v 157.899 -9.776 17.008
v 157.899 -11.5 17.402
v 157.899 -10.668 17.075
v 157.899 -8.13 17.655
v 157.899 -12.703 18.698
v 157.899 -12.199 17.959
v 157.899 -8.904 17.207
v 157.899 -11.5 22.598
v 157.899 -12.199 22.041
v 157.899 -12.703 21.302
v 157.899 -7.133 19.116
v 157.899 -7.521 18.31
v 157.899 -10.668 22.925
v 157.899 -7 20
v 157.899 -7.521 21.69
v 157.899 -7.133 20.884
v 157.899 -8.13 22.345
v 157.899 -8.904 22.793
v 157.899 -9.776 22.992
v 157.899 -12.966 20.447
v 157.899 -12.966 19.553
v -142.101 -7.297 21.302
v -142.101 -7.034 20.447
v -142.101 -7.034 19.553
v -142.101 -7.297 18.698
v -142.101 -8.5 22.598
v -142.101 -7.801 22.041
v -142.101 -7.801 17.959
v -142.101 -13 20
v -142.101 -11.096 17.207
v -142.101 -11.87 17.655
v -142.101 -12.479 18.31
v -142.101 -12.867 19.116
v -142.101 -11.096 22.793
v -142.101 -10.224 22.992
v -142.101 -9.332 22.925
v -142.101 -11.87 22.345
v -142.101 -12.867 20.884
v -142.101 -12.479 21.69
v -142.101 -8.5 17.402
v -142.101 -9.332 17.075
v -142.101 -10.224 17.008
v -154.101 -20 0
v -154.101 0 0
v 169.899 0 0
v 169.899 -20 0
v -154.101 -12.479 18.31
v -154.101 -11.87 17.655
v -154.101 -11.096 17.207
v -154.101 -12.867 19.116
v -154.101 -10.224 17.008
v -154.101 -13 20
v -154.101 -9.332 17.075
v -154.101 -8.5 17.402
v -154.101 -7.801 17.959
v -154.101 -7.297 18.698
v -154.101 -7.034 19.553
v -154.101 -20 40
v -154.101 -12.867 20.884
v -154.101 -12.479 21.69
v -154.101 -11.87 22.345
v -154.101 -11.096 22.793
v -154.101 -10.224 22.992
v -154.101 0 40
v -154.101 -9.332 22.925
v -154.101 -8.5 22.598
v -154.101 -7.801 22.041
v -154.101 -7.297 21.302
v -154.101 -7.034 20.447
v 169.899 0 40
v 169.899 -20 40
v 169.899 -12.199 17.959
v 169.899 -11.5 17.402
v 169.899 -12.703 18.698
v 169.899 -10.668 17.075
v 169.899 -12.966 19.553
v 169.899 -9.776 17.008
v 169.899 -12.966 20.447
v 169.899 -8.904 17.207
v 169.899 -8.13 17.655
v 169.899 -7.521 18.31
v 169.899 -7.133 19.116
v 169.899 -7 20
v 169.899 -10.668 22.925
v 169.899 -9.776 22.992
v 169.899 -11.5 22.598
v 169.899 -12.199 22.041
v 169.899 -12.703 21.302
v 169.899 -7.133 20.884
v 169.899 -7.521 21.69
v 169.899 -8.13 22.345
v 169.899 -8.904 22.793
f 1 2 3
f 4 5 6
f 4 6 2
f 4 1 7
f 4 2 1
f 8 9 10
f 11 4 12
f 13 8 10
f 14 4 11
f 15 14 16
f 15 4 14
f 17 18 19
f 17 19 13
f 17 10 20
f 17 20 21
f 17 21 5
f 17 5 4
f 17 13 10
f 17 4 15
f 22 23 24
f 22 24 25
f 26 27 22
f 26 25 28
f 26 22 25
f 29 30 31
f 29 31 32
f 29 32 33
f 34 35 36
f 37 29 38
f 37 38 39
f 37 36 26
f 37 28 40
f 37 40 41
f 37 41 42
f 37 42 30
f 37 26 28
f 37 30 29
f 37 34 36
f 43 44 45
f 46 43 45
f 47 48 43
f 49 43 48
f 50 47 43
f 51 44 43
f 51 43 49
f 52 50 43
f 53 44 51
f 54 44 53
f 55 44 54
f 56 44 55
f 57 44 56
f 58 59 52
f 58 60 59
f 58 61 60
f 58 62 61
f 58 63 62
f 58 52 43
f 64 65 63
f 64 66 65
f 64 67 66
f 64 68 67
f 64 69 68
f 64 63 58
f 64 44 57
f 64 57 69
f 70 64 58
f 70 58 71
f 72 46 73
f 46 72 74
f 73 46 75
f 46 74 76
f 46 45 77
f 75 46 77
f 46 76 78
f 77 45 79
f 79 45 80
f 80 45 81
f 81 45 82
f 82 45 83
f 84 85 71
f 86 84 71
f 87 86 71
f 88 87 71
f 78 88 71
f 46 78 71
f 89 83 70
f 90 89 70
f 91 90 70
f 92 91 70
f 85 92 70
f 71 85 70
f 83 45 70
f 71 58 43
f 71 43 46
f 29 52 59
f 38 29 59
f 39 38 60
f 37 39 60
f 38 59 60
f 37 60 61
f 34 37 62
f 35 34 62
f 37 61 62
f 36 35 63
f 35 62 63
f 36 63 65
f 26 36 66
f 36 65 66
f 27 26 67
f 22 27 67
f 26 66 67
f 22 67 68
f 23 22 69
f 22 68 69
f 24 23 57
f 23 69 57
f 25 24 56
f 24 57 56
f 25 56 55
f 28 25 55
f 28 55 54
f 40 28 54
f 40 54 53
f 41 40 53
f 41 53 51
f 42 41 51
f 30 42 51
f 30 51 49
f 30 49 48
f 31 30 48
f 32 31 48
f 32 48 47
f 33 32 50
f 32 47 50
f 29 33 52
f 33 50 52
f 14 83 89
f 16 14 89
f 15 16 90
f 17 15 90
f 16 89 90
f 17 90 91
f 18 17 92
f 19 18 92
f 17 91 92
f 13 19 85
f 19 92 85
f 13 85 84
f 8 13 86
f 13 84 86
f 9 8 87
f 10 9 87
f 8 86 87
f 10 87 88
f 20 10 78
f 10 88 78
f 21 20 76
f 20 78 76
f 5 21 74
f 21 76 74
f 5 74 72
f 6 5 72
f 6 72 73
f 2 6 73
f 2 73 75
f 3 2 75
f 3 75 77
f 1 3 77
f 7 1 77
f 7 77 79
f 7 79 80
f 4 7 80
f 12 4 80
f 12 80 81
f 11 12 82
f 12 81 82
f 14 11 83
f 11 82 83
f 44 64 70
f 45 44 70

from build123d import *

# Parameters (mm, degrees)
F0_W     = 324
F0_H     = 40
F1_DEPTH = 20
F2_R     = 3
F4_DEPTH = 12
F3_R     = 3
F5_DEPTH = 12


with BuildPart() as f1:
    # F0 (on Front) → F1 (new body)
    with BuildSketch(Plane.XZ):
        with Locations((7.898747, 20)):
            Rectangle(F0_W, F0_H)
    extrude(amount=F1_DEPTH)

    # F2 (on face) → F4 (cut)
    with BuildSketch(Plane.YZ.offset(169.898747)):
        with Locations((-10, 20)):
            Circle(F2_R)
    extrude(amount=-F4_DEPTH, mode=Mode.SUBTRACT)

    # F3 (on face) → F5 (cut)
    with BuildSketch(Plane(origin=(-154.101253, 0, 0), x_dir=(0, -1, 0), z_dir=(-1, 0, 0))):
        with Locations((10, 20)):
            Circle(F3_R)
    extrude(amount=-F5_DEPTH, mode=Mode.SUBTRACT)


solid = f1.part
